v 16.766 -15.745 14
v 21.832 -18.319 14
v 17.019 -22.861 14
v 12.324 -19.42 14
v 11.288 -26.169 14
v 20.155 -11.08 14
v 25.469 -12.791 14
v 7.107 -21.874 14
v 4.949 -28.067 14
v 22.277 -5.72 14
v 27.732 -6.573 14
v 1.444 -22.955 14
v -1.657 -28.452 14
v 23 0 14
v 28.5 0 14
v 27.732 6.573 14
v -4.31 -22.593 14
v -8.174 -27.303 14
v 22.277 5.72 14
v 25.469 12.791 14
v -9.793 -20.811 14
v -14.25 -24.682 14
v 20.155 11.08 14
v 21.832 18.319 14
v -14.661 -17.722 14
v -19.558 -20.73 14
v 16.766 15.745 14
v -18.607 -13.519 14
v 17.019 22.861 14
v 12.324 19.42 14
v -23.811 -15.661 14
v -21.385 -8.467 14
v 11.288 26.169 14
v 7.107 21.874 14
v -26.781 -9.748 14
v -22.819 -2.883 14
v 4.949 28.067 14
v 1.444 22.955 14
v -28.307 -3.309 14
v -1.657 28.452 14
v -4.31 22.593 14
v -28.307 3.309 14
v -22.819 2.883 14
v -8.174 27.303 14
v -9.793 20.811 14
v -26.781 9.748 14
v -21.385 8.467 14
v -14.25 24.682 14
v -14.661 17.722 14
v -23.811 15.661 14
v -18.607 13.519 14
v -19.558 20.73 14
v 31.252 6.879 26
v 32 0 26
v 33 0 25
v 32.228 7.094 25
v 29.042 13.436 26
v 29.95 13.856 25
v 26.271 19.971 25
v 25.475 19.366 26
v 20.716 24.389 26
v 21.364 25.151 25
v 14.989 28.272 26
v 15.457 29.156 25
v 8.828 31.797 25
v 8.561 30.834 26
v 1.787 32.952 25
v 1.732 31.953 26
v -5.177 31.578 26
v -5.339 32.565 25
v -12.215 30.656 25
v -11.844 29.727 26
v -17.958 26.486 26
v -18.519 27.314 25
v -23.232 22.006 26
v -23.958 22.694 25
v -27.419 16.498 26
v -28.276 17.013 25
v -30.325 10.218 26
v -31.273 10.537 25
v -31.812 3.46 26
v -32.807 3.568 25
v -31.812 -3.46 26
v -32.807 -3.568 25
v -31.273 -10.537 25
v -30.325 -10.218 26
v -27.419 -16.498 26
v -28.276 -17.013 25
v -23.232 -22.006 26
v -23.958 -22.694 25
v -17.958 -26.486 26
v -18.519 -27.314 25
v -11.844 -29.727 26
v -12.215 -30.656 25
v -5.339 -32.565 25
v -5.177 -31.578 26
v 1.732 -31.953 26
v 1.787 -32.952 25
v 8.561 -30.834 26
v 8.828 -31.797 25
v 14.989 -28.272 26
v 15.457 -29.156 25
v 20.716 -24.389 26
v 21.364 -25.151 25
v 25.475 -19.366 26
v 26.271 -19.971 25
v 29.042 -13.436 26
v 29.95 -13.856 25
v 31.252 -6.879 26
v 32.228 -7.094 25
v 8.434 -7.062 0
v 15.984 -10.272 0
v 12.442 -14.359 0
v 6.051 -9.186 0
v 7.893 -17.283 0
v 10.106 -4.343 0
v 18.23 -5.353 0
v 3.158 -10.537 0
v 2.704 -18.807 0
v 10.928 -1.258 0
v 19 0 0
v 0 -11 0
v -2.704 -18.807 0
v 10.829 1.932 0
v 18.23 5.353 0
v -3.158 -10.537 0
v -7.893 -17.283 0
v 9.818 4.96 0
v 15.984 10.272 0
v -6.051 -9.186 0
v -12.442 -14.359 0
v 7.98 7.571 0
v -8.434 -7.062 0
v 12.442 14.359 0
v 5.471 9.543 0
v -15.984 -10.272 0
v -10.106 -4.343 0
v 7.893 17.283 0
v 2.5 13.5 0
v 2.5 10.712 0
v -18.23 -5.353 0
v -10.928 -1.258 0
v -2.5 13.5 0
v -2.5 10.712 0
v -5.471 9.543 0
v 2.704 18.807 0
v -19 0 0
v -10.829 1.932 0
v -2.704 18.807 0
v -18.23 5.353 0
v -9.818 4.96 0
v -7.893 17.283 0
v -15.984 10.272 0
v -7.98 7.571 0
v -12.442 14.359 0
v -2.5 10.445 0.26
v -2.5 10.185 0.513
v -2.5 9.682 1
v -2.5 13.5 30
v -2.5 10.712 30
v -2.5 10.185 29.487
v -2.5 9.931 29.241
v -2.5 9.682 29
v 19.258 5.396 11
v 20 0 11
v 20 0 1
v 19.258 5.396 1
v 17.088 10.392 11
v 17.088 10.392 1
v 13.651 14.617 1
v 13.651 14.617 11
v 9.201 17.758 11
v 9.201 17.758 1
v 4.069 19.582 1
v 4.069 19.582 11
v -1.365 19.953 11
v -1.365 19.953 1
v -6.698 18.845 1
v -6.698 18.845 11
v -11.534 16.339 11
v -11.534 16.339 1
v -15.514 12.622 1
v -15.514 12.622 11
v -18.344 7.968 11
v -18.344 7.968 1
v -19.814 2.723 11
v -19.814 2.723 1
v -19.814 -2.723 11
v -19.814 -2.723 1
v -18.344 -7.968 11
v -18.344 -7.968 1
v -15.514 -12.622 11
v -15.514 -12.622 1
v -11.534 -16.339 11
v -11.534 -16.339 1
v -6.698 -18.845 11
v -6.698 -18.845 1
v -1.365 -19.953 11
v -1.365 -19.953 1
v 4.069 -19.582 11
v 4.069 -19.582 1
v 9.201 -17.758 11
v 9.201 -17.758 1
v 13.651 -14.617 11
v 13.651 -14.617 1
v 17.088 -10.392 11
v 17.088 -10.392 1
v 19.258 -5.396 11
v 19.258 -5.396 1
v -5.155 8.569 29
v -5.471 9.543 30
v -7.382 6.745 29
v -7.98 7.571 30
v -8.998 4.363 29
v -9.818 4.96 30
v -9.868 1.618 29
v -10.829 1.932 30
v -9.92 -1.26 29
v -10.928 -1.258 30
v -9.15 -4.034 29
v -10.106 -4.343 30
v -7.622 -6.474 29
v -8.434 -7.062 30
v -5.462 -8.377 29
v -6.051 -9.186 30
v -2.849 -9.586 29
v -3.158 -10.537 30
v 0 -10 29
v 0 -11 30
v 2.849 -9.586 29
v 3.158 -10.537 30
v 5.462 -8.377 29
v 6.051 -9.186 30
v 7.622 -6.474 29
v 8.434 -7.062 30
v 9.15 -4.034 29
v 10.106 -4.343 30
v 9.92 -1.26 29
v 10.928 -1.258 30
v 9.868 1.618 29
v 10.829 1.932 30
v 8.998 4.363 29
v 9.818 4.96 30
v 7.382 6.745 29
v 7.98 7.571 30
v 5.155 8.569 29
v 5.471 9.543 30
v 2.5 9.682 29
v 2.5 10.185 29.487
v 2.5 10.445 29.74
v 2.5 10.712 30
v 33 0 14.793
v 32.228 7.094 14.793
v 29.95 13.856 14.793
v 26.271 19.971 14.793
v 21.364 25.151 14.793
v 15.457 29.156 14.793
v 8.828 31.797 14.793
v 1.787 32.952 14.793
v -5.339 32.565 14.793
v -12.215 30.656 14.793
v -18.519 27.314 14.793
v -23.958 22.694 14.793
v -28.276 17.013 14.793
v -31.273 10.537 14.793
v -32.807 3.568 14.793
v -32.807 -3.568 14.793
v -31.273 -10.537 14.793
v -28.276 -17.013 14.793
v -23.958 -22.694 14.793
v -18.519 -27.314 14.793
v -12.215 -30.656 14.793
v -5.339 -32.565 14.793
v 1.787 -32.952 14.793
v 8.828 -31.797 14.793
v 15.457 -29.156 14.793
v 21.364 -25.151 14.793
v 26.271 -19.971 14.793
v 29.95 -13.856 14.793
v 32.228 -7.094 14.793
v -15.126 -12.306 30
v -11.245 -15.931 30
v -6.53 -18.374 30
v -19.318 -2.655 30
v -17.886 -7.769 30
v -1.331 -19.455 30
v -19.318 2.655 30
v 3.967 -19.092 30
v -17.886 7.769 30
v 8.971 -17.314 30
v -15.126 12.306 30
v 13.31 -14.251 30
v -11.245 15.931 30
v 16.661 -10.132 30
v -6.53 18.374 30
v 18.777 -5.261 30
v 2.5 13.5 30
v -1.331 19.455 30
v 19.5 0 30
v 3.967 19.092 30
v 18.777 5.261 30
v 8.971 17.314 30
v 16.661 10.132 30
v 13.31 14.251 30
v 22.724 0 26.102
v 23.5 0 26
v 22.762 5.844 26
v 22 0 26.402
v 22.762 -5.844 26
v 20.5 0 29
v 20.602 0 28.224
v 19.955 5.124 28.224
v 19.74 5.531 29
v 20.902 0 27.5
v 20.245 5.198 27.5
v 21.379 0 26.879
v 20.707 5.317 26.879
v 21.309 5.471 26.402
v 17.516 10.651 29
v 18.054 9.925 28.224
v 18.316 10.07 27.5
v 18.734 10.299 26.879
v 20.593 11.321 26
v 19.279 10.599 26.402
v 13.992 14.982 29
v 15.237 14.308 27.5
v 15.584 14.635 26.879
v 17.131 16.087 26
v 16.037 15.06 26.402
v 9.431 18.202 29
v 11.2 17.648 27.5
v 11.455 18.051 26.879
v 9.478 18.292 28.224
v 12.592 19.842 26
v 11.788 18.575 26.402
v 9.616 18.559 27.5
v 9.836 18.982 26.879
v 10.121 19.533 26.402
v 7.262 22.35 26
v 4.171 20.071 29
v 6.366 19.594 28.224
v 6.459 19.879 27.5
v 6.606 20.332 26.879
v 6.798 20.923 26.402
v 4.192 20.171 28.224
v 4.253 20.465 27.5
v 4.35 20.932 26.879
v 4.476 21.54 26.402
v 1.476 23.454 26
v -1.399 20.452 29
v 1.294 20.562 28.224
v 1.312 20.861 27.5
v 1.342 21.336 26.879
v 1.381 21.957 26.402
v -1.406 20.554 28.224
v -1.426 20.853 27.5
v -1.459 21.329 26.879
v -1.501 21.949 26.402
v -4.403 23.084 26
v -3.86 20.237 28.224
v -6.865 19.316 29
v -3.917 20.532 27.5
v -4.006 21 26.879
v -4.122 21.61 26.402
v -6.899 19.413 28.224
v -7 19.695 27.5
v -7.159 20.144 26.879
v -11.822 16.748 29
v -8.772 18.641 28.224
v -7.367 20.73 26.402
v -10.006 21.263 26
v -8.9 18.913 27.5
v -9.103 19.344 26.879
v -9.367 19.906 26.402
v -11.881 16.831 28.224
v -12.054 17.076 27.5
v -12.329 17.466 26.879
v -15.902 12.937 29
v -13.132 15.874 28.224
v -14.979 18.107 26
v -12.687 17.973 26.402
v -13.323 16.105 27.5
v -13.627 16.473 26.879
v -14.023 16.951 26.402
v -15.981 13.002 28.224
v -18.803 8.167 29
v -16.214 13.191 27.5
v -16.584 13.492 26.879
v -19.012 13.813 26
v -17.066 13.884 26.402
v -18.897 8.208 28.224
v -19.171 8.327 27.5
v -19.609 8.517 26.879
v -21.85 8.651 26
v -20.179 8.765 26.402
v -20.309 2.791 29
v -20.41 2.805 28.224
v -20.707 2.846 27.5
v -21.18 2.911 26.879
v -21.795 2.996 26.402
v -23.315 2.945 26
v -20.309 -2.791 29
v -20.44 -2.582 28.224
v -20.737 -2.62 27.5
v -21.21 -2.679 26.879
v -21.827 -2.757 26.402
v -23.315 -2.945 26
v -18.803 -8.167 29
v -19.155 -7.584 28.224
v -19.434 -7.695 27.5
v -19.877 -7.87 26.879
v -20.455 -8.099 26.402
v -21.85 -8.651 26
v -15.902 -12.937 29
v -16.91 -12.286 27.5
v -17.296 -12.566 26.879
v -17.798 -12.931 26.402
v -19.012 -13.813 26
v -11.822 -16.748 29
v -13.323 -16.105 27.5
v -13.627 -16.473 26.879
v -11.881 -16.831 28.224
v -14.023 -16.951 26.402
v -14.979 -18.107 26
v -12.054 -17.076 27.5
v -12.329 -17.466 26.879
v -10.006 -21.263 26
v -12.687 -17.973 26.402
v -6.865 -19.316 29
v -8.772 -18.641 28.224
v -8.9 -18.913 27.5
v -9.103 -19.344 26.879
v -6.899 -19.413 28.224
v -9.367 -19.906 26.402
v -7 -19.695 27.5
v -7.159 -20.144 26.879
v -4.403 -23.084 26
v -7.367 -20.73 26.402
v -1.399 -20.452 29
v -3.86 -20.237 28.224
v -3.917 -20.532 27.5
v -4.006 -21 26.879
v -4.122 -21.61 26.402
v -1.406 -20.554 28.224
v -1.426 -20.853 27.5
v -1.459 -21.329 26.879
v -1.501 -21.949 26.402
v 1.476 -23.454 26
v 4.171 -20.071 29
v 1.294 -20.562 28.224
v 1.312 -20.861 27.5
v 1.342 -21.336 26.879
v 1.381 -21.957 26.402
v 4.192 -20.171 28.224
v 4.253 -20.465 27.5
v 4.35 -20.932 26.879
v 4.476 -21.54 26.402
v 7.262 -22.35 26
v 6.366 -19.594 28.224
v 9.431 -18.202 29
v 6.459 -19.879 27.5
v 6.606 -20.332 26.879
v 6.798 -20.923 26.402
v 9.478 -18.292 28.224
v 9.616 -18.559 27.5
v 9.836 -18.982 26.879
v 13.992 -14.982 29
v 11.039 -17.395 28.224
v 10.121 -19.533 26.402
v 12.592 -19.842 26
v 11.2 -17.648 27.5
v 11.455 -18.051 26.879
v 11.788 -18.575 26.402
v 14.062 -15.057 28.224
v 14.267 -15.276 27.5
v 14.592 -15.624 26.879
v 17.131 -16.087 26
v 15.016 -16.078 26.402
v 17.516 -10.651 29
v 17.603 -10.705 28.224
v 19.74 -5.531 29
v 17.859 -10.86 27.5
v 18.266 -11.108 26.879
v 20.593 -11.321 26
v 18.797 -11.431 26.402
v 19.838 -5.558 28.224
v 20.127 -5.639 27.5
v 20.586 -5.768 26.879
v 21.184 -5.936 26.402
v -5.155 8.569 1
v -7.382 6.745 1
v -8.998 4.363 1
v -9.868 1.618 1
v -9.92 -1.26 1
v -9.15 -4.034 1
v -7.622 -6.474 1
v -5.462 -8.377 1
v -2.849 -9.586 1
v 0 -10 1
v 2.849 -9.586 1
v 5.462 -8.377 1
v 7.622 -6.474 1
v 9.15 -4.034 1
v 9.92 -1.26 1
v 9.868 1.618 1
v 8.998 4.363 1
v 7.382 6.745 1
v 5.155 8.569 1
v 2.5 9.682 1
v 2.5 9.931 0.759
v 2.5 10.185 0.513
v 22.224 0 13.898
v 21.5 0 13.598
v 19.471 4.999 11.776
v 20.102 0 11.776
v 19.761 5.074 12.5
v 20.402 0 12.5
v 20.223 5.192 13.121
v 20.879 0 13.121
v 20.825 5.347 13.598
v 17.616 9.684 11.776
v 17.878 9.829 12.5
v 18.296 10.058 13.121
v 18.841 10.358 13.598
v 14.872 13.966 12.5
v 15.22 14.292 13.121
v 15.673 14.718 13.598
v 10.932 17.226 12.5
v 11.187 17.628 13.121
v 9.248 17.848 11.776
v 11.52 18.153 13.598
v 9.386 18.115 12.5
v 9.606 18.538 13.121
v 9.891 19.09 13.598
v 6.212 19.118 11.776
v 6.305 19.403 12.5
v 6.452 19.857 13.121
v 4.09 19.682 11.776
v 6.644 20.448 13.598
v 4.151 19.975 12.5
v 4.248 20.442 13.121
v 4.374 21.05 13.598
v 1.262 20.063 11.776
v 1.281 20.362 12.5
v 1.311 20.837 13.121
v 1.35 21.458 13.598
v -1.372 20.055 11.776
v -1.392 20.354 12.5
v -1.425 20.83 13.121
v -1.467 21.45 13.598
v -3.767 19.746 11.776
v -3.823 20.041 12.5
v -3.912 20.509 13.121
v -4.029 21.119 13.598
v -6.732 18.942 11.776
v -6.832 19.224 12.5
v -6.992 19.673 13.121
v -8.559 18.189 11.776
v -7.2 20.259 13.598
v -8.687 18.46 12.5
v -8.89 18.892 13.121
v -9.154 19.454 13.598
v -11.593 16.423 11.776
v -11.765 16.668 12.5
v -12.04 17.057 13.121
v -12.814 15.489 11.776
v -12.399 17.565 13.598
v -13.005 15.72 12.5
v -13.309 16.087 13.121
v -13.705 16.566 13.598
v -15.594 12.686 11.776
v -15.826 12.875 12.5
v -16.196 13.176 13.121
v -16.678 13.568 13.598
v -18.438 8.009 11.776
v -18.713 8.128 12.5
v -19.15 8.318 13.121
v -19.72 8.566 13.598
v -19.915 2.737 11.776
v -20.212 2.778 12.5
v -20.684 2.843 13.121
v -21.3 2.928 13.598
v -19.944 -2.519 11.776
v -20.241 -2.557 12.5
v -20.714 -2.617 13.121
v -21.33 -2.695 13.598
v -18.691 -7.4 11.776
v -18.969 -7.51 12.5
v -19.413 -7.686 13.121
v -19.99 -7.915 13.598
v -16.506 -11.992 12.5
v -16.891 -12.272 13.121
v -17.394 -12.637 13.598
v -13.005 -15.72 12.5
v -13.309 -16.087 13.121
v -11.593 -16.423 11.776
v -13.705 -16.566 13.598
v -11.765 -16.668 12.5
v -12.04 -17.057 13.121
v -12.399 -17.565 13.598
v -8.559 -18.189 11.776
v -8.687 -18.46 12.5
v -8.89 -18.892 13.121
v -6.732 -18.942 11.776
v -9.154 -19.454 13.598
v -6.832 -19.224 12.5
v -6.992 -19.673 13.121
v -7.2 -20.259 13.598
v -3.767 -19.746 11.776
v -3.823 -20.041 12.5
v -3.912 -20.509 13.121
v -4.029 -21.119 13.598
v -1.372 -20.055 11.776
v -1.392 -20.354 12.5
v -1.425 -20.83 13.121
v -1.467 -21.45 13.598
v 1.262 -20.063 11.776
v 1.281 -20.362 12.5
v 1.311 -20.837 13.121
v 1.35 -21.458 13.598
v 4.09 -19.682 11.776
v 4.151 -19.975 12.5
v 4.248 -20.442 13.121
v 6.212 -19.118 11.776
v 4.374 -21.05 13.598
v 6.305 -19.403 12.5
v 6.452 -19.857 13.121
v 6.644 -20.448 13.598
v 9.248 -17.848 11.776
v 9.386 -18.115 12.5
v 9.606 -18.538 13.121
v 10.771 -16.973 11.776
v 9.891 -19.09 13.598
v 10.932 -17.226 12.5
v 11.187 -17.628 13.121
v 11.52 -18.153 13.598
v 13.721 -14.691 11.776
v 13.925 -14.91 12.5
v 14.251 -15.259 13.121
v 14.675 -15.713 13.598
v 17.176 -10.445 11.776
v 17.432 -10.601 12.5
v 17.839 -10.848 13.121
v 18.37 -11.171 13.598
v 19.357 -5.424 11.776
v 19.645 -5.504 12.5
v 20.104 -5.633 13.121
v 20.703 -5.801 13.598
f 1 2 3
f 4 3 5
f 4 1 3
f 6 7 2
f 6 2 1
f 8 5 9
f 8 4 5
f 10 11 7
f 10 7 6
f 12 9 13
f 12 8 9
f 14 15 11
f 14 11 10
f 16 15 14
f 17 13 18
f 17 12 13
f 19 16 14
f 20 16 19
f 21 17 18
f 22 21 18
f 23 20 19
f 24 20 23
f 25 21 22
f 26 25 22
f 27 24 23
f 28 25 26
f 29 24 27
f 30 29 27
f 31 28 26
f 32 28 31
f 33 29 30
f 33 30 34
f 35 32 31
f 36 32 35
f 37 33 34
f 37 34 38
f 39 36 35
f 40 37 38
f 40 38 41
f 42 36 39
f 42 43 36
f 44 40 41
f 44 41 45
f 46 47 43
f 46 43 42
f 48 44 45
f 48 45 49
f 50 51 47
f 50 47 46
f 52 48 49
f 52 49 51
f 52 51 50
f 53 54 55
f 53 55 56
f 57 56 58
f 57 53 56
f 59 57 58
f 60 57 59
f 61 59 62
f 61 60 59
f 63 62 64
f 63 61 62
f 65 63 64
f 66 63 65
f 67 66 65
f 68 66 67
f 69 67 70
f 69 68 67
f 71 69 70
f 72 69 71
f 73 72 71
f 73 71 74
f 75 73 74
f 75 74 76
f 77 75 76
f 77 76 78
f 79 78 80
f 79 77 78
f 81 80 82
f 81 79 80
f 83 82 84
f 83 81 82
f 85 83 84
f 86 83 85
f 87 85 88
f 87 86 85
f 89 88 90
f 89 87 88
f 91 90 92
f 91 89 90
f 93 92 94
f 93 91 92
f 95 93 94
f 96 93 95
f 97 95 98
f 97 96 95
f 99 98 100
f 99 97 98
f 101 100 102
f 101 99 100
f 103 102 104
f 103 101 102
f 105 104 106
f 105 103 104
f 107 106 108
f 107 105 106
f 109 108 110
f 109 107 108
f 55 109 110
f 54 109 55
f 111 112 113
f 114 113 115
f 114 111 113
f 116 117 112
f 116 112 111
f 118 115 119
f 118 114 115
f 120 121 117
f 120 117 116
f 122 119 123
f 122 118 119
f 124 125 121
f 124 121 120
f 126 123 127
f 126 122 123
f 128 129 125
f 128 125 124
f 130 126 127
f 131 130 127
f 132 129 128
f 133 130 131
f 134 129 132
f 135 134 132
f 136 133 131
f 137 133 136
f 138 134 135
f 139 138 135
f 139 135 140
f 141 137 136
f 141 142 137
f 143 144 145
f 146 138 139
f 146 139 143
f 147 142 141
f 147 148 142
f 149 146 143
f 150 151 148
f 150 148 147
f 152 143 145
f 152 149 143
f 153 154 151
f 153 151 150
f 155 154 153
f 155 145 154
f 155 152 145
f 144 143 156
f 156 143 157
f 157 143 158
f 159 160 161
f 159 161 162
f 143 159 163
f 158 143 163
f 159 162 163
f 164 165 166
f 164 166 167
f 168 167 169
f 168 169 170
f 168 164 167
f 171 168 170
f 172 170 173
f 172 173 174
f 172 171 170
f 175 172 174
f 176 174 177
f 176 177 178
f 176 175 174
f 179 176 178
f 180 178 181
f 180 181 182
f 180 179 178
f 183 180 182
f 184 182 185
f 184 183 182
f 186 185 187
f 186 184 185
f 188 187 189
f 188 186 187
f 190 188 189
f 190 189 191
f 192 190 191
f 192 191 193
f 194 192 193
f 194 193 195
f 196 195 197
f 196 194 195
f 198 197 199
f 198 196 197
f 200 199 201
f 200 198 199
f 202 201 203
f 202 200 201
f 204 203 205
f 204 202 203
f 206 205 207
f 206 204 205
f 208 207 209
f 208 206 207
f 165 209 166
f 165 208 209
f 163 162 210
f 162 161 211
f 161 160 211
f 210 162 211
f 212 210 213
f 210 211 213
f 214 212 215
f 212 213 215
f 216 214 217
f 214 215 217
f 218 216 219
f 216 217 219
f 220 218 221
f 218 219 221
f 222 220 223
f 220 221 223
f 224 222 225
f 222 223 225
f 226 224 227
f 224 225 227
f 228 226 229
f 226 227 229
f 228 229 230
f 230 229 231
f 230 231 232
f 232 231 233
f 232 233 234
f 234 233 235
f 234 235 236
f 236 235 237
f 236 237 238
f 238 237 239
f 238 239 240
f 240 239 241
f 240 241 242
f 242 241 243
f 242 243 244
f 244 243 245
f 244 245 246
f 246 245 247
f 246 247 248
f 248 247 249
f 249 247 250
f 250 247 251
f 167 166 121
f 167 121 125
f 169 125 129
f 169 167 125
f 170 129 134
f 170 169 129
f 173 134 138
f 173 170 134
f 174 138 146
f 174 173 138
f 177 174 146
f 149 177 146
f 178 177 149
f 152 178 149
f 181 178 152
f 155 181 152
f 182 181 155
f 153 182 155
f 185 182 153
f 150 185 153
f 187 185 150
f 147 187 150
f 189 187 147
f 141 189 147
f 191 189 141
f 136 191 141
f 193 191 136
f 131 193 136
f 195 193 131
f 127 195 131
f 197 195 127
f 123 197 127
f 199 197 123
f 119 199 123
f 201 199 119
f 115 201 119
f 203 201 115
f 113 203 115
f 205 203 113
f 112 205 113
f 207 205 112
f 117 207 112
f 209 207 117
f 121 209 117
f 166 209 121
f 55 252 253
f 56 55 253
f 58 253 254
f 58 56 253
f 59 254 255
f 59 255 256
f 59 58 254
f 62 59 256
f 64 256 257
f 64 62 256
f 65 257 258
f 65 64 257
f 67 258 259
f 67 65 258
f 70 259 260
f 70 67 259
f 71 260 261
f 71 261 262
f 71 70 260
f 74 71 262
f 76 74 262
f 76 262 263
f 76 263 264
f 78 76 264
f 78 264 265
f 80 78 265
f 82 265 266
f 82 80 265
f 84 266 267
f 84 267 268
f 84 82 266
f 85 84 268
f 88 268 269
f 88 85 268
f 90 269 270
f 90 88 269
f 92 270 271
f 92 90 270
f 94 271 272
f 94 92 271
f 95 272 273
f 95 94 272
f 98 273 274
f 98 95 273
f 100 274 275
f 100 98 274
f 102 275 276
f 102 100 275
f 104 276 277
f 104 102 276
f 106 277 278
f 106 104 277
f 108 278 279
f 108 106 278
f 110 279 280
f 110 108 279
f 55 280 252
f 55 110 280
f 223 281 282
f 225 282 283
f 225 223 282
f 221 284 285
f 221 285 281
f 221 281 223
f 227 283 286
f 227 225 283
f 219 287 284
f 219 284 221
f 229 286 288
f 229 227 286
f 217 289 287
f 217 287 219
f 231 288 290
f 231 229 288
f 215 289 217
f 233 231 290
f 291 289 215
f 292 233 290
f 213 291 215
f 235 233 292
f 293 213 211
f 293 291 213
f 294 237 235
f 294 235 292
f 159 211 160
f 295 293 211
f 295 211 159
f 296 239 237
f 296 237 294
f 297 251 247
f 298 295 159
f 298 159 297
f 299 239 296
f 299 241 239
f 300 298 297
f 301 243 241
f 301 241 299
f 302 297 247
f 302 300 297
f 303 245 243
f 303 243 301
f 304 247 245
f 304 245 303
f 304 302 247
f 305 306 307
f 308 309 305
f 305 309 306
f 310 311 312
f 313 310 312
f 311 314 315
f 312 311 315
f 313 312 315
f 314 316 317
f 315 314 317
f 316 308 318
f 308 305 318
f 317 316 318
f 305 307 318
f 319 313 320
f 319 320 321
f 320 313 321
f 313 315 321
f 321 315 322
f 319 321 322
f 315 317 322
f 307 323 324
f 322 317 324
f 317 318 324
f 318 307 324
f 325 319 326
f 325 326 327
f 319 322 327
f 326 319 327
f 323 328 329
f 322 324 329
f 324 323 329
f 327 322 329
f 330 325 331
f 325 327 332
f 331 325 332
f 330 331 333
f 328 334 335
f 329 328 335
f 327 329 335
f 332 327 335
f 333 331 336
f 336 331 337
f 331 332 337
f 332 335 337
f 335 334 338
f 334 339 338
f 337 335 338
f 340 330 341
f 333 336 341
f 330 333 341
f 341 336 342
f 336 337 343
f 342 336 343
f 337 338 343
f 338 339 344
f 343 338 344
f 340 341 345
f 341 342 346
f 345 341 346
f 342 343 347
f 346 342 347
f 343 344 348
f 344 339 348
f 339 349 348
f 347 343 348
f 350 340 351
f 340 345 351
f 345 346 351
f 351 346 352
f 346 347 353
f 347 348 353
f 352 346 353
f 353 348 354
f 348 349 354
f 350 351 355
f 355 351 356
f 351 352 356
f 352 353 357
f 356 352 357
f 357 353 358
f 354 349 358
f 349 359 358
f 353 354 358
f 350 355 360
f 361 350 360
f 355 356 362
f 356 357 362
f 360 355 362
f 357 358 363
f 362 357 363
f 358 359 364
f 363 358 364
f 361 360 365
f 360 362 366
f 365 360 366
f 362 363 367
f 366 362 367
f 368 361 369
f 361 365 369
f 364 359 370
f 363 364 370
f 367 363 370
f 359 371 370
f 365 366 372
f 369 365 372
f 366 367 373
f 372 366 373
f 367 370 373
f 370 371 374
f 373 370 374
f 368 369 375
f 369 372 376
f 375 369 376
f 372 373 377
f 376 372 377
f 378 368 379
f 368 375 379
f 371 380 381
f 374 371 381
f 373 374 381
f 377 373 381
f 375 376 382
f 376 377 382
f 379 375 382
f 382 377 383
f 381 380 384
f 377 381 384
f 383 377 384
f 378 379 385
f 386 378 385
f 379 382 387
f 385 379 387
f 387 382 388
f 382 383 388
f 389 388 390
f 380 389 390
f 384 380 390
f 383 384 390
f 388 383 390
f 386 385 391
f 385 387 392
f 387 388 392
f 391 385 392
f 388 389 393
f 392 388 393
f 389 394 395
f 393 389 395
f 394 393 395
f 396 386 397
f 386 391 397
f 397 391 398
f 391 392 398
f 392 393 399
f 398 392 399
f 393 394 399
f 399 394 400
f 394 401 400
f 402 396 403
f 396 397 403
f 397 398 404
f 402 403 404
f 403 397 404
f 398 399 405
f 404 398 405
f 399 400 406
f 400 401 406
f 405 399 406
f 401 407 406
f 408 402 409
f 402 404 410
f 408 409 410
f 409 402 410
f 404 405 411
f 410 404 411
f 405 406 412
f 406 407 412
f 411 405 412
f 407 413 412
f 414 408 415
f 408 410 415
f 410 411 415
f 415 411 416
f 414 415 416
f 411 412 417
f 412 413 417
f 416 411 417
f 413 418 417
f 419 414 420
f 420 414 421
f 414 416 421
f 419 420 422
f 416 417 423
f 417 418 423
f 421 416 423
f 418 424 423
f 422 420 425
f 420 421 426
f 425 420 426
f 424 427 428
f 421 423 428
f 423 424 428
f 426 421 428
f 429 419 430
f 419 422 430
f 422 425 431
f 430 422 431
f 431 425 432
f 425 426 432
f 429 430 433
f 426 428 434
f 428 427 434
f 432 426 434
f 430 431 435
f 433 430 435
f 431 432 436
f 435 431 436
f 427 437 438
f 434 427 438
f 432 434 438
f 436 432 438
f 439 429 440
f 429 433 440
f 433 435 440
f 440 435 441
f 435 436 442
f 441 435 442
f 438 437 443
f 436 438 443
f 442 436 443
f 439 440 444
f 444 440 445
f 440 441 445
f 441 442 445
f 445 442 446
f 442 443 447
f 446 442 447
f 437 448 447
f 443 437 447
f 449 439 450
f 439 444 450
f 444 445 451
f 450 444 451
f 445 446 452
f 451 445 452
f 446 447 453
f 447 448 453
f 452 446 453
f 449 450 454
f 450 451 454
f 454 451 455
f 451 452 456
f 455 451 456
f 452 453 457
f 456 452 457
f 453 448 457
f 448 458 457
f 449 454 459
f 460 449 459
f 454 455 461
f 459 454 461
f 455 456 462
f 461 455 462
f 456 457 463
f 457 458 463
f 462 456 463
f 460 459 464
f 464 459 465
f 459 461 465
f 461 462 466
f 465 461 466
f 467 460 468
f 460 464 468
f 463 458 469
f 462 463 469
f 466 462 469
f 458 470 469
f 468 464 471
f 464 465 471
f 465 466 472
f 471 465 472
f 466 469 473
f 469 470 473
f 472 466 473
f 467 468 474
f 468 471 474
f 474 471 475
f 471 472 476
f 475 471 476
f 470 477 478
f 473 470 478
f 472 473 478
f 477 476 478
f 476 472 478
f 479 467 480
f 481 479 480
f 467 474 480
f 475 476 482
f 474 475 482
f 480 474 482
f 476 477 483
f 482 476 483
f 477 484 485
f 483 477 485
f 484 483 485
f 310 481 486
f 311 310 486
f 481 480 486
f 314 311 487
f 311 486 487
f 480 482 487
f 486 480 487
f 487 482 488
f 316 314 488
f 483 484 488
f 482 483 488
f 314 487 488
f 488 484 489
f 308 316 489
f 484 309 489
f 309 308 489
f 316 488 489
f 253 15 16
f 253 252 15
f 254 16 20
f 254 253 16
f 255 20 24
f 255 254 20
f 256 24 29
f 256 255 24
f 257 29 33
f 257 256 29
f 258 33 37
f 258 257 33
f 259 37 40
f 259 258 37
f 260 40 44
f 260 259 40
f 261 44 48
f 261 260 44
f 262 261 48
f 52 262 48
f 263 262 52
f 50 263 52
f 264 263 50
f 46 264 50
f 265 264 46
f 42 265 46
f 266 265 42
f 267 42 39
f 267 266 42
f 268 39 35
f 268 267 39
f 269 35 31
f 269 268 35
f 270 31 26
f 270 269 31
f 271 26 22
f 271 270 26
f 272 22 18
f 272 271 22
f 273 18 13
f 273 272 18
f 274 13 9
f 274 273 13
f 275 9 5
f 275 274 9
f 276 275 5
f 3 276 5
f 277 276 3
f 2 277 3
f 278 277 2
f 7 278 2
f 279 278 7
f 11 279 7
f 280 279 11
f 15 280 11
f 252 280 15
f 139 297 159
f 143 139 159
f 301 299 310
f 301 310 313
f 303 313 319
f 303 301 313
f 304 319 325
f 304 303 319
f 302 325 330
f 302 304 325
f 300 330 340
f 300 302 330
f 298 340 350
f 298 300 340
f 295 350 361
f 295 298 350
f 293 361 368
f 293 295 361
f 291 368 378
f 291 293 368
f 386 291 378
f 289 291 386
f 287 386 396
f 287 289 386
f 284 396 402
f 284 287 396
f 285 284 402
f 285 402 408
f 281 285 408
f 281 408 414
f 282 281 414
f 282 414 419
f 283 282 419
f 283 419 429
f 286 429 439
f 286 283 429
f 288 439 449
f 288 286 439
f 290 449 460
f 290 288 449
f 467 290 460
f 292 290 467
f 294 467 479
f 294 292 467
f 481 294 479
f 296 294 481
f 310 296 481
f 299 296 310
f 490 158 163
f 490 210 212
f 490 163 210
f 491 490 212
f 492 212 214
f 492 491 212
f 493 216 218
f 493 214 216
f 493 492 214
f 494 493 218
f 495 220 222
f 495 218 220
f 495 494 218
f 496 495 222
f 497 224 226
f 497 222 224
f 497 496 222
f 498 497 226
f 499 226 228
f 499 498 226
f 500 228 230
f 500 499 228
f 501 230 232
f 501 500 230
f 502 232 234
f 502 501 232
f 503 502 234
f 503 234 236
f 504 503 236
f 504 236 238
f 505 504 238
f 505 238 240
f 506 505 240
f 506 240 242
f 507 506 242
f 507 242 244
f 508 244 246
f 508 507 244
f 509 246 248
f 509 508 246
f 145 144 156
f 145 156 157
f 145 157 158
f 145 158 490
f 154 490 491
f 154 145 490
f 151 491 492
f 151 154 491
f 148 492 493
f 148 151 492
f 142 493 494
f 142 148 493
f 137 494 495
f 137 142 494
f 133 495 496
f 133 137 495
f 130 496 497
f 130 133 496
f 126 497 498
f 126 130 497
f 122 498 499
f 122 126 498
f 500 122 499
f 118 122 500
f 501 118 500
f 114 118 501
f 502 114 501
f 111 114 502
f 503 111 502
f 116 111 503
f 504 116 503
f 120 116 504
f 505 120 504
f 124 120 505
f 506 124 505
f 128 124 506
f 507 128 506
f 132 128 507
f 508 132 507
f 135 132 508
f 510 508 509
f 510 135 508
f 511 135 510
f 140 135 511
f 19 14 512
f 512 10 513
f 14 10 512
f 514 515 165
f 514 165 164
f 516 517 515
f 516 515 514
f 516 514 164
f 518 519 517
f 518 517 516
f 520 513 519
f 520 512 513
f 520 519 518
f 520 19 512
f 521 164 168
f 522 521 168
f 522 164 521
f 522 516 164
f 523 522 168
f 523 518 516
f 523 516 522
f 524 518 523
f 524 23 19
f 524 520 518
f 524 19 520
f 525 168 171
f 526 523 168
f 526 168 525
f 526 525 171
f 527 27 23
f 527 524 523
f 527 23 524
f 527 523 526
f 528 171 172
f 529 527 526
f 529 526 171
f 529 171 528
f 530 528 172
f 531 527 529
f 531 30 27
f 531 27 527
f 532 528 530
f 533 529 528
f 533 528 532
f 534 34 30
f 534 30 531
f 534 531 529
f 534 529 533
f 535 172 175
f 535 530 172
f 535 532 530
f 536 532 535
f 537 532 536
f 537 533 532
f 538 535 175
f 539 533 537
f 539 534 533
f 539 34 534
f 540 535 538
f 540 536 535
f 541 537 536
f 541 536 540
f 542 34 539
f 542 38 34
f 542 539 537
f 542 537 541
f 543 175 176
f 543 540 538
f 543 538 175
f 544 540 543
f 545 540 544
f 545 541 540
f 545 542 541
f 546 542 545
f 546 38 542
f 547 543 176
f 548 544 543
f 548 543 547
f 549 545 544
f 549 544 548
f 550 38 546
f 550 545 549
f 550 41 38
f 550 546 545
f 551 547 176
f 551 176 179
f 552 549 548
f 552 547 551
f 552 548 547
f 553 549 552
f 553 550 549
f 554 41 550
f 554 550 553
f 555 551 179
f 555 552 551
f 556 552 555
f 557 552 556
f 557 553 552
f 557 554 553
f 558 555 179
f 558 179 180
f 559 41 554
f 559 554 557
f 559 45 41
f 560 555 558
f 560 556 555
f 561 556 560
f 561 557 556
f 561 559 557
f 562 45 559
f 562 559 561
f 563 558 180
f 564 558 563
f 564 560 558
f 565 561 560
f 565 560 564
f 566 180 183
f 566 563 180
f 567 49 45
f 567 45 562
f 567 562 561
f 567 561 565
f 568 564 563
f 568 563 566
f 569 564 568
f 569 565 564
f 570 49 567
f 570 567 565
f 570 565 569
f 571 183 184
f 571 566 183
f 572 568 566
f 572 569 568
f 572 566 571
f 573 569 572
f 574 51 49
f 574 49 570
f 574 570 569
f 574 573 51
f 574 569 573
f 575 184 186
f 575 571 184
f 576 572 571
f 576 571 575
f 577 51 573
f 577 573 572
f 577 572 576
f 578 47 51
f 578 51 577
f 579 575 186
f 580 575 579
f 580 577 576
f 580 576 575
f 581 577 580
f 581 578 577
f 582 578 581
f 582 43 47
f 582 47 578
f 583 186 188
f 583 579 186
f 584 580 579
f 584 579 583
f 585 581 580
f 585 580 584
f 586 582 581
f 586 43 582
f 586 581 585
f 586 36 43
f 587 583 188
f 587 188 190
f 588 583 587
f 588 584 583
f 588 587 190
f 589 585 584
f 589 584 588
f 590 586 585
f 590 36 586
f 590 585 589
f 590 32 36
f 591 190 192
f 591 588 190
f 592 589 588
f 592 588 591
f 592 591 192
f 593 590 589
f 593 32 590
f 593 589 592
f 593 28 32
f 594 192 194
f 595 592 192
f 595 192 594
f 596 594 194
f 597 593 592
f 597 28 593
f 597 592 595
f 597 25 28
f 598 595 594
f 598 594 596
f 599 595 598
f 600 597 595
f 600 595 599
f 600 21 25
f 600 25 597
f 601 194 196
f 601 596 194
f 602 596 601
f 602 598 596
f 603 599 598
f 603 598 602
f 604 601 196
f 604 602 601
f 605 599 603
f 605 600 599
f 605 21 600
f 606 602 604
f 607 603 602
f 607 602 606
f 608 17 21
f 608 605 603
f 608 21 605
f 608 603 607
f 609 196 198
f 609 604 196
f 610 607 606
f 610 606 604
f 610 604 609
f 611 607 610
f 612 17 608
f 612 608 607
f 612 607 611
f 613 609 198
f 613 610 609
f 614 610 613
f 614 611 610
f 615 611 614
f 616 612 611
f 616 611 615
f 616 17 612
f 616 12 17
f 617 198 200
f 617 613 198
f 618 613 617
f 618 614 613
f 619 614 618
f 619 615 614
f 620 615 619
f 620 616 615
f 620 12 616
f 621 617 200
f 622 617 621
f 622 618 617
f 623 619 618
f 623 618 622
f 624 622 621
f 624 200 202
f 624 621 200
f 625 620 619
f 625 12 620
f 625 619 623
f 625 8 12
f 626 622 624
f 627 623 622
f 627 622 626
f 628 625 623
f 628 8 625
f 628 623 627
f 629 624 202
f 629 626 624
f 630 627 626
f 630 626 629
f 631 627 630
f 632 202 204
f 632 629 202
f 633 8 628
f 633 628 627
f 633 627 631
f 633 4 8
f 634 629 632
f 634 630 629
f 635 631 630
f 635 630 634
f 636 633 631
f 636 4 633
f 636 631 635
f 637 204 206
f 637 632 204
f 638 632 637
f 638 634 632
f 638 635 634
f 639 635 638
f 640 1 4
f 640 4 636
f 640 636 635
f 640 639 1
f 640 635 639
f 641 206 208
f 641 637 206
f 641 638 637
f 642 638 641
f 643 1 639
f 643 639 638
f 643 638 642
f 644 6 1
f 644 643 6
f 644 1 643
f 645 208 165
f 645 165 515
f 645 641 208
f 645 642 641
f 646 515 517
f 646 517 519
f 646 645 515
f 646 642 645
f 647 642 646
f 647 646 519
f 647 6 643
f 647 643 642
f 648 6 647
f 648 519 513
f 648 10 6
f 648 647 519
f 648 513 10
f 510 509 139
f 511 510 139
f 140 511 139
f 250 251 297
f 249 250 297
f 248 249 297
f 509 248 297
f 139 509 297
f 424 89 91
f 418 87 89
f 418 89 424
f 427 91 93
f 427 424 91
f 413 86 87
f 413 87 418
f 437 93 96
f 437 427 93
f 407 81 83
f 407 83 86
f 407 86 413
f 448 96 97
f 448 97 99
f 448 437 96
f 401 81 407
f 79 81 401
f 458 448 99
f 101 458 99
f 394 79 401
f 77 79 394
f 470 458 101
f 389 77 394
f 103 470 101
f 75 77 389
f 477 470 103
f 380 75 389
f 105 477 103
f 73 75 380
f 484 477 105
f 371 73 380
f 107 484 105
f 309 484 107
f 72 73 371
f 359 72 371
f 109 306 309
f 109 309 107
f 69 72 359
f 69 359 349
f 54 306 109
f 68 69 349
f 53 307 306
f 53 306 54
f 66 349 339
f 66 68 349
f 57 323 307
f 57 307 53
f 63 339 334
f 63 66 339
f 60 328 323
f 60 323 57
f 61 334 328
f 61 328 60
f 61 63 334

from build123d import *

# Parameters (mm, degrees)
F2_SIZE  = 1
F3_R     = 2.99999
F5_DEPTH = 30


# Not quite as in the source:
# - a fillet or chamfer is up to 0.001 mm smaller than in the source, because OpenCascade refuses the exact size


with BuildPart() as f1:
    # F0 (on Front) → F1 (revolve)
    with BuildSketch(Plane.XZ):
        Polygon((10, 30), (10, 0), (20, 0), (20, 14), (28.5, 14), (33, 14.7934714132), (33, 26), (20.5, 26), (20.5, 30), align=None)
    revolve(axis=Axis((0, 0, 2.9418331105), (0, 0, 1)))

    # F2
    f2_edges = [f1.edges().sort_by_distance(p)[0] for p in [
        (-20.5, 0, 30),
        (-33, 0, 26),
        (-20, 0, 0),
        (-10, 0, 30),
        (-10, 0, 0),
    ]]
    chamfer(f2_edges, length=F2_SIZE)

    # F3 (radius 3 in the source; OpenCascade refuses exactly that, so slightly less here)
    f3_edges = [f1.edges().sort_by_distance(p)[0] for p in [
        (-20, 0, 14),
        (-20.5, 0, 26),
    ]]
    fillet(f3_edges, radius=F3_R)

    # F4 (on face) → F5 (cut, through all)
    with BuildSketch(Plane.XY.offset(30)):
        with BuildLine():
            Line((2.5, 13.5), (-2.5, 13.5))
            Line((-2.5, 13.5), (-2.5, 10.7121426428))
            ThreePointArc((-2.5, 10.7121426428), (0, 11), (2.5, 10.7121426428))
            Line((2.5, 10.7121426428), (2.5, 13.5))
        make_face()
        with BuildLine():
            ThreePointArc((2.5, 10.7121426428), (0, 11), (-2.5, 10.7121426428))
            Line((-2.5, 10.7121426428), (-2.5, 9.6824583655))
            ThreePointArc((-2.5, 9.6824583655), (0, 10), (2.5, 9.6824583655))
            Line((2.5, 9.6824583655), (2.5, 10.7121426428))
        make_face()
    extrude(amount=-F5_DEPTH, mode=Mode.SUBTRACT)


solid = f1.part
